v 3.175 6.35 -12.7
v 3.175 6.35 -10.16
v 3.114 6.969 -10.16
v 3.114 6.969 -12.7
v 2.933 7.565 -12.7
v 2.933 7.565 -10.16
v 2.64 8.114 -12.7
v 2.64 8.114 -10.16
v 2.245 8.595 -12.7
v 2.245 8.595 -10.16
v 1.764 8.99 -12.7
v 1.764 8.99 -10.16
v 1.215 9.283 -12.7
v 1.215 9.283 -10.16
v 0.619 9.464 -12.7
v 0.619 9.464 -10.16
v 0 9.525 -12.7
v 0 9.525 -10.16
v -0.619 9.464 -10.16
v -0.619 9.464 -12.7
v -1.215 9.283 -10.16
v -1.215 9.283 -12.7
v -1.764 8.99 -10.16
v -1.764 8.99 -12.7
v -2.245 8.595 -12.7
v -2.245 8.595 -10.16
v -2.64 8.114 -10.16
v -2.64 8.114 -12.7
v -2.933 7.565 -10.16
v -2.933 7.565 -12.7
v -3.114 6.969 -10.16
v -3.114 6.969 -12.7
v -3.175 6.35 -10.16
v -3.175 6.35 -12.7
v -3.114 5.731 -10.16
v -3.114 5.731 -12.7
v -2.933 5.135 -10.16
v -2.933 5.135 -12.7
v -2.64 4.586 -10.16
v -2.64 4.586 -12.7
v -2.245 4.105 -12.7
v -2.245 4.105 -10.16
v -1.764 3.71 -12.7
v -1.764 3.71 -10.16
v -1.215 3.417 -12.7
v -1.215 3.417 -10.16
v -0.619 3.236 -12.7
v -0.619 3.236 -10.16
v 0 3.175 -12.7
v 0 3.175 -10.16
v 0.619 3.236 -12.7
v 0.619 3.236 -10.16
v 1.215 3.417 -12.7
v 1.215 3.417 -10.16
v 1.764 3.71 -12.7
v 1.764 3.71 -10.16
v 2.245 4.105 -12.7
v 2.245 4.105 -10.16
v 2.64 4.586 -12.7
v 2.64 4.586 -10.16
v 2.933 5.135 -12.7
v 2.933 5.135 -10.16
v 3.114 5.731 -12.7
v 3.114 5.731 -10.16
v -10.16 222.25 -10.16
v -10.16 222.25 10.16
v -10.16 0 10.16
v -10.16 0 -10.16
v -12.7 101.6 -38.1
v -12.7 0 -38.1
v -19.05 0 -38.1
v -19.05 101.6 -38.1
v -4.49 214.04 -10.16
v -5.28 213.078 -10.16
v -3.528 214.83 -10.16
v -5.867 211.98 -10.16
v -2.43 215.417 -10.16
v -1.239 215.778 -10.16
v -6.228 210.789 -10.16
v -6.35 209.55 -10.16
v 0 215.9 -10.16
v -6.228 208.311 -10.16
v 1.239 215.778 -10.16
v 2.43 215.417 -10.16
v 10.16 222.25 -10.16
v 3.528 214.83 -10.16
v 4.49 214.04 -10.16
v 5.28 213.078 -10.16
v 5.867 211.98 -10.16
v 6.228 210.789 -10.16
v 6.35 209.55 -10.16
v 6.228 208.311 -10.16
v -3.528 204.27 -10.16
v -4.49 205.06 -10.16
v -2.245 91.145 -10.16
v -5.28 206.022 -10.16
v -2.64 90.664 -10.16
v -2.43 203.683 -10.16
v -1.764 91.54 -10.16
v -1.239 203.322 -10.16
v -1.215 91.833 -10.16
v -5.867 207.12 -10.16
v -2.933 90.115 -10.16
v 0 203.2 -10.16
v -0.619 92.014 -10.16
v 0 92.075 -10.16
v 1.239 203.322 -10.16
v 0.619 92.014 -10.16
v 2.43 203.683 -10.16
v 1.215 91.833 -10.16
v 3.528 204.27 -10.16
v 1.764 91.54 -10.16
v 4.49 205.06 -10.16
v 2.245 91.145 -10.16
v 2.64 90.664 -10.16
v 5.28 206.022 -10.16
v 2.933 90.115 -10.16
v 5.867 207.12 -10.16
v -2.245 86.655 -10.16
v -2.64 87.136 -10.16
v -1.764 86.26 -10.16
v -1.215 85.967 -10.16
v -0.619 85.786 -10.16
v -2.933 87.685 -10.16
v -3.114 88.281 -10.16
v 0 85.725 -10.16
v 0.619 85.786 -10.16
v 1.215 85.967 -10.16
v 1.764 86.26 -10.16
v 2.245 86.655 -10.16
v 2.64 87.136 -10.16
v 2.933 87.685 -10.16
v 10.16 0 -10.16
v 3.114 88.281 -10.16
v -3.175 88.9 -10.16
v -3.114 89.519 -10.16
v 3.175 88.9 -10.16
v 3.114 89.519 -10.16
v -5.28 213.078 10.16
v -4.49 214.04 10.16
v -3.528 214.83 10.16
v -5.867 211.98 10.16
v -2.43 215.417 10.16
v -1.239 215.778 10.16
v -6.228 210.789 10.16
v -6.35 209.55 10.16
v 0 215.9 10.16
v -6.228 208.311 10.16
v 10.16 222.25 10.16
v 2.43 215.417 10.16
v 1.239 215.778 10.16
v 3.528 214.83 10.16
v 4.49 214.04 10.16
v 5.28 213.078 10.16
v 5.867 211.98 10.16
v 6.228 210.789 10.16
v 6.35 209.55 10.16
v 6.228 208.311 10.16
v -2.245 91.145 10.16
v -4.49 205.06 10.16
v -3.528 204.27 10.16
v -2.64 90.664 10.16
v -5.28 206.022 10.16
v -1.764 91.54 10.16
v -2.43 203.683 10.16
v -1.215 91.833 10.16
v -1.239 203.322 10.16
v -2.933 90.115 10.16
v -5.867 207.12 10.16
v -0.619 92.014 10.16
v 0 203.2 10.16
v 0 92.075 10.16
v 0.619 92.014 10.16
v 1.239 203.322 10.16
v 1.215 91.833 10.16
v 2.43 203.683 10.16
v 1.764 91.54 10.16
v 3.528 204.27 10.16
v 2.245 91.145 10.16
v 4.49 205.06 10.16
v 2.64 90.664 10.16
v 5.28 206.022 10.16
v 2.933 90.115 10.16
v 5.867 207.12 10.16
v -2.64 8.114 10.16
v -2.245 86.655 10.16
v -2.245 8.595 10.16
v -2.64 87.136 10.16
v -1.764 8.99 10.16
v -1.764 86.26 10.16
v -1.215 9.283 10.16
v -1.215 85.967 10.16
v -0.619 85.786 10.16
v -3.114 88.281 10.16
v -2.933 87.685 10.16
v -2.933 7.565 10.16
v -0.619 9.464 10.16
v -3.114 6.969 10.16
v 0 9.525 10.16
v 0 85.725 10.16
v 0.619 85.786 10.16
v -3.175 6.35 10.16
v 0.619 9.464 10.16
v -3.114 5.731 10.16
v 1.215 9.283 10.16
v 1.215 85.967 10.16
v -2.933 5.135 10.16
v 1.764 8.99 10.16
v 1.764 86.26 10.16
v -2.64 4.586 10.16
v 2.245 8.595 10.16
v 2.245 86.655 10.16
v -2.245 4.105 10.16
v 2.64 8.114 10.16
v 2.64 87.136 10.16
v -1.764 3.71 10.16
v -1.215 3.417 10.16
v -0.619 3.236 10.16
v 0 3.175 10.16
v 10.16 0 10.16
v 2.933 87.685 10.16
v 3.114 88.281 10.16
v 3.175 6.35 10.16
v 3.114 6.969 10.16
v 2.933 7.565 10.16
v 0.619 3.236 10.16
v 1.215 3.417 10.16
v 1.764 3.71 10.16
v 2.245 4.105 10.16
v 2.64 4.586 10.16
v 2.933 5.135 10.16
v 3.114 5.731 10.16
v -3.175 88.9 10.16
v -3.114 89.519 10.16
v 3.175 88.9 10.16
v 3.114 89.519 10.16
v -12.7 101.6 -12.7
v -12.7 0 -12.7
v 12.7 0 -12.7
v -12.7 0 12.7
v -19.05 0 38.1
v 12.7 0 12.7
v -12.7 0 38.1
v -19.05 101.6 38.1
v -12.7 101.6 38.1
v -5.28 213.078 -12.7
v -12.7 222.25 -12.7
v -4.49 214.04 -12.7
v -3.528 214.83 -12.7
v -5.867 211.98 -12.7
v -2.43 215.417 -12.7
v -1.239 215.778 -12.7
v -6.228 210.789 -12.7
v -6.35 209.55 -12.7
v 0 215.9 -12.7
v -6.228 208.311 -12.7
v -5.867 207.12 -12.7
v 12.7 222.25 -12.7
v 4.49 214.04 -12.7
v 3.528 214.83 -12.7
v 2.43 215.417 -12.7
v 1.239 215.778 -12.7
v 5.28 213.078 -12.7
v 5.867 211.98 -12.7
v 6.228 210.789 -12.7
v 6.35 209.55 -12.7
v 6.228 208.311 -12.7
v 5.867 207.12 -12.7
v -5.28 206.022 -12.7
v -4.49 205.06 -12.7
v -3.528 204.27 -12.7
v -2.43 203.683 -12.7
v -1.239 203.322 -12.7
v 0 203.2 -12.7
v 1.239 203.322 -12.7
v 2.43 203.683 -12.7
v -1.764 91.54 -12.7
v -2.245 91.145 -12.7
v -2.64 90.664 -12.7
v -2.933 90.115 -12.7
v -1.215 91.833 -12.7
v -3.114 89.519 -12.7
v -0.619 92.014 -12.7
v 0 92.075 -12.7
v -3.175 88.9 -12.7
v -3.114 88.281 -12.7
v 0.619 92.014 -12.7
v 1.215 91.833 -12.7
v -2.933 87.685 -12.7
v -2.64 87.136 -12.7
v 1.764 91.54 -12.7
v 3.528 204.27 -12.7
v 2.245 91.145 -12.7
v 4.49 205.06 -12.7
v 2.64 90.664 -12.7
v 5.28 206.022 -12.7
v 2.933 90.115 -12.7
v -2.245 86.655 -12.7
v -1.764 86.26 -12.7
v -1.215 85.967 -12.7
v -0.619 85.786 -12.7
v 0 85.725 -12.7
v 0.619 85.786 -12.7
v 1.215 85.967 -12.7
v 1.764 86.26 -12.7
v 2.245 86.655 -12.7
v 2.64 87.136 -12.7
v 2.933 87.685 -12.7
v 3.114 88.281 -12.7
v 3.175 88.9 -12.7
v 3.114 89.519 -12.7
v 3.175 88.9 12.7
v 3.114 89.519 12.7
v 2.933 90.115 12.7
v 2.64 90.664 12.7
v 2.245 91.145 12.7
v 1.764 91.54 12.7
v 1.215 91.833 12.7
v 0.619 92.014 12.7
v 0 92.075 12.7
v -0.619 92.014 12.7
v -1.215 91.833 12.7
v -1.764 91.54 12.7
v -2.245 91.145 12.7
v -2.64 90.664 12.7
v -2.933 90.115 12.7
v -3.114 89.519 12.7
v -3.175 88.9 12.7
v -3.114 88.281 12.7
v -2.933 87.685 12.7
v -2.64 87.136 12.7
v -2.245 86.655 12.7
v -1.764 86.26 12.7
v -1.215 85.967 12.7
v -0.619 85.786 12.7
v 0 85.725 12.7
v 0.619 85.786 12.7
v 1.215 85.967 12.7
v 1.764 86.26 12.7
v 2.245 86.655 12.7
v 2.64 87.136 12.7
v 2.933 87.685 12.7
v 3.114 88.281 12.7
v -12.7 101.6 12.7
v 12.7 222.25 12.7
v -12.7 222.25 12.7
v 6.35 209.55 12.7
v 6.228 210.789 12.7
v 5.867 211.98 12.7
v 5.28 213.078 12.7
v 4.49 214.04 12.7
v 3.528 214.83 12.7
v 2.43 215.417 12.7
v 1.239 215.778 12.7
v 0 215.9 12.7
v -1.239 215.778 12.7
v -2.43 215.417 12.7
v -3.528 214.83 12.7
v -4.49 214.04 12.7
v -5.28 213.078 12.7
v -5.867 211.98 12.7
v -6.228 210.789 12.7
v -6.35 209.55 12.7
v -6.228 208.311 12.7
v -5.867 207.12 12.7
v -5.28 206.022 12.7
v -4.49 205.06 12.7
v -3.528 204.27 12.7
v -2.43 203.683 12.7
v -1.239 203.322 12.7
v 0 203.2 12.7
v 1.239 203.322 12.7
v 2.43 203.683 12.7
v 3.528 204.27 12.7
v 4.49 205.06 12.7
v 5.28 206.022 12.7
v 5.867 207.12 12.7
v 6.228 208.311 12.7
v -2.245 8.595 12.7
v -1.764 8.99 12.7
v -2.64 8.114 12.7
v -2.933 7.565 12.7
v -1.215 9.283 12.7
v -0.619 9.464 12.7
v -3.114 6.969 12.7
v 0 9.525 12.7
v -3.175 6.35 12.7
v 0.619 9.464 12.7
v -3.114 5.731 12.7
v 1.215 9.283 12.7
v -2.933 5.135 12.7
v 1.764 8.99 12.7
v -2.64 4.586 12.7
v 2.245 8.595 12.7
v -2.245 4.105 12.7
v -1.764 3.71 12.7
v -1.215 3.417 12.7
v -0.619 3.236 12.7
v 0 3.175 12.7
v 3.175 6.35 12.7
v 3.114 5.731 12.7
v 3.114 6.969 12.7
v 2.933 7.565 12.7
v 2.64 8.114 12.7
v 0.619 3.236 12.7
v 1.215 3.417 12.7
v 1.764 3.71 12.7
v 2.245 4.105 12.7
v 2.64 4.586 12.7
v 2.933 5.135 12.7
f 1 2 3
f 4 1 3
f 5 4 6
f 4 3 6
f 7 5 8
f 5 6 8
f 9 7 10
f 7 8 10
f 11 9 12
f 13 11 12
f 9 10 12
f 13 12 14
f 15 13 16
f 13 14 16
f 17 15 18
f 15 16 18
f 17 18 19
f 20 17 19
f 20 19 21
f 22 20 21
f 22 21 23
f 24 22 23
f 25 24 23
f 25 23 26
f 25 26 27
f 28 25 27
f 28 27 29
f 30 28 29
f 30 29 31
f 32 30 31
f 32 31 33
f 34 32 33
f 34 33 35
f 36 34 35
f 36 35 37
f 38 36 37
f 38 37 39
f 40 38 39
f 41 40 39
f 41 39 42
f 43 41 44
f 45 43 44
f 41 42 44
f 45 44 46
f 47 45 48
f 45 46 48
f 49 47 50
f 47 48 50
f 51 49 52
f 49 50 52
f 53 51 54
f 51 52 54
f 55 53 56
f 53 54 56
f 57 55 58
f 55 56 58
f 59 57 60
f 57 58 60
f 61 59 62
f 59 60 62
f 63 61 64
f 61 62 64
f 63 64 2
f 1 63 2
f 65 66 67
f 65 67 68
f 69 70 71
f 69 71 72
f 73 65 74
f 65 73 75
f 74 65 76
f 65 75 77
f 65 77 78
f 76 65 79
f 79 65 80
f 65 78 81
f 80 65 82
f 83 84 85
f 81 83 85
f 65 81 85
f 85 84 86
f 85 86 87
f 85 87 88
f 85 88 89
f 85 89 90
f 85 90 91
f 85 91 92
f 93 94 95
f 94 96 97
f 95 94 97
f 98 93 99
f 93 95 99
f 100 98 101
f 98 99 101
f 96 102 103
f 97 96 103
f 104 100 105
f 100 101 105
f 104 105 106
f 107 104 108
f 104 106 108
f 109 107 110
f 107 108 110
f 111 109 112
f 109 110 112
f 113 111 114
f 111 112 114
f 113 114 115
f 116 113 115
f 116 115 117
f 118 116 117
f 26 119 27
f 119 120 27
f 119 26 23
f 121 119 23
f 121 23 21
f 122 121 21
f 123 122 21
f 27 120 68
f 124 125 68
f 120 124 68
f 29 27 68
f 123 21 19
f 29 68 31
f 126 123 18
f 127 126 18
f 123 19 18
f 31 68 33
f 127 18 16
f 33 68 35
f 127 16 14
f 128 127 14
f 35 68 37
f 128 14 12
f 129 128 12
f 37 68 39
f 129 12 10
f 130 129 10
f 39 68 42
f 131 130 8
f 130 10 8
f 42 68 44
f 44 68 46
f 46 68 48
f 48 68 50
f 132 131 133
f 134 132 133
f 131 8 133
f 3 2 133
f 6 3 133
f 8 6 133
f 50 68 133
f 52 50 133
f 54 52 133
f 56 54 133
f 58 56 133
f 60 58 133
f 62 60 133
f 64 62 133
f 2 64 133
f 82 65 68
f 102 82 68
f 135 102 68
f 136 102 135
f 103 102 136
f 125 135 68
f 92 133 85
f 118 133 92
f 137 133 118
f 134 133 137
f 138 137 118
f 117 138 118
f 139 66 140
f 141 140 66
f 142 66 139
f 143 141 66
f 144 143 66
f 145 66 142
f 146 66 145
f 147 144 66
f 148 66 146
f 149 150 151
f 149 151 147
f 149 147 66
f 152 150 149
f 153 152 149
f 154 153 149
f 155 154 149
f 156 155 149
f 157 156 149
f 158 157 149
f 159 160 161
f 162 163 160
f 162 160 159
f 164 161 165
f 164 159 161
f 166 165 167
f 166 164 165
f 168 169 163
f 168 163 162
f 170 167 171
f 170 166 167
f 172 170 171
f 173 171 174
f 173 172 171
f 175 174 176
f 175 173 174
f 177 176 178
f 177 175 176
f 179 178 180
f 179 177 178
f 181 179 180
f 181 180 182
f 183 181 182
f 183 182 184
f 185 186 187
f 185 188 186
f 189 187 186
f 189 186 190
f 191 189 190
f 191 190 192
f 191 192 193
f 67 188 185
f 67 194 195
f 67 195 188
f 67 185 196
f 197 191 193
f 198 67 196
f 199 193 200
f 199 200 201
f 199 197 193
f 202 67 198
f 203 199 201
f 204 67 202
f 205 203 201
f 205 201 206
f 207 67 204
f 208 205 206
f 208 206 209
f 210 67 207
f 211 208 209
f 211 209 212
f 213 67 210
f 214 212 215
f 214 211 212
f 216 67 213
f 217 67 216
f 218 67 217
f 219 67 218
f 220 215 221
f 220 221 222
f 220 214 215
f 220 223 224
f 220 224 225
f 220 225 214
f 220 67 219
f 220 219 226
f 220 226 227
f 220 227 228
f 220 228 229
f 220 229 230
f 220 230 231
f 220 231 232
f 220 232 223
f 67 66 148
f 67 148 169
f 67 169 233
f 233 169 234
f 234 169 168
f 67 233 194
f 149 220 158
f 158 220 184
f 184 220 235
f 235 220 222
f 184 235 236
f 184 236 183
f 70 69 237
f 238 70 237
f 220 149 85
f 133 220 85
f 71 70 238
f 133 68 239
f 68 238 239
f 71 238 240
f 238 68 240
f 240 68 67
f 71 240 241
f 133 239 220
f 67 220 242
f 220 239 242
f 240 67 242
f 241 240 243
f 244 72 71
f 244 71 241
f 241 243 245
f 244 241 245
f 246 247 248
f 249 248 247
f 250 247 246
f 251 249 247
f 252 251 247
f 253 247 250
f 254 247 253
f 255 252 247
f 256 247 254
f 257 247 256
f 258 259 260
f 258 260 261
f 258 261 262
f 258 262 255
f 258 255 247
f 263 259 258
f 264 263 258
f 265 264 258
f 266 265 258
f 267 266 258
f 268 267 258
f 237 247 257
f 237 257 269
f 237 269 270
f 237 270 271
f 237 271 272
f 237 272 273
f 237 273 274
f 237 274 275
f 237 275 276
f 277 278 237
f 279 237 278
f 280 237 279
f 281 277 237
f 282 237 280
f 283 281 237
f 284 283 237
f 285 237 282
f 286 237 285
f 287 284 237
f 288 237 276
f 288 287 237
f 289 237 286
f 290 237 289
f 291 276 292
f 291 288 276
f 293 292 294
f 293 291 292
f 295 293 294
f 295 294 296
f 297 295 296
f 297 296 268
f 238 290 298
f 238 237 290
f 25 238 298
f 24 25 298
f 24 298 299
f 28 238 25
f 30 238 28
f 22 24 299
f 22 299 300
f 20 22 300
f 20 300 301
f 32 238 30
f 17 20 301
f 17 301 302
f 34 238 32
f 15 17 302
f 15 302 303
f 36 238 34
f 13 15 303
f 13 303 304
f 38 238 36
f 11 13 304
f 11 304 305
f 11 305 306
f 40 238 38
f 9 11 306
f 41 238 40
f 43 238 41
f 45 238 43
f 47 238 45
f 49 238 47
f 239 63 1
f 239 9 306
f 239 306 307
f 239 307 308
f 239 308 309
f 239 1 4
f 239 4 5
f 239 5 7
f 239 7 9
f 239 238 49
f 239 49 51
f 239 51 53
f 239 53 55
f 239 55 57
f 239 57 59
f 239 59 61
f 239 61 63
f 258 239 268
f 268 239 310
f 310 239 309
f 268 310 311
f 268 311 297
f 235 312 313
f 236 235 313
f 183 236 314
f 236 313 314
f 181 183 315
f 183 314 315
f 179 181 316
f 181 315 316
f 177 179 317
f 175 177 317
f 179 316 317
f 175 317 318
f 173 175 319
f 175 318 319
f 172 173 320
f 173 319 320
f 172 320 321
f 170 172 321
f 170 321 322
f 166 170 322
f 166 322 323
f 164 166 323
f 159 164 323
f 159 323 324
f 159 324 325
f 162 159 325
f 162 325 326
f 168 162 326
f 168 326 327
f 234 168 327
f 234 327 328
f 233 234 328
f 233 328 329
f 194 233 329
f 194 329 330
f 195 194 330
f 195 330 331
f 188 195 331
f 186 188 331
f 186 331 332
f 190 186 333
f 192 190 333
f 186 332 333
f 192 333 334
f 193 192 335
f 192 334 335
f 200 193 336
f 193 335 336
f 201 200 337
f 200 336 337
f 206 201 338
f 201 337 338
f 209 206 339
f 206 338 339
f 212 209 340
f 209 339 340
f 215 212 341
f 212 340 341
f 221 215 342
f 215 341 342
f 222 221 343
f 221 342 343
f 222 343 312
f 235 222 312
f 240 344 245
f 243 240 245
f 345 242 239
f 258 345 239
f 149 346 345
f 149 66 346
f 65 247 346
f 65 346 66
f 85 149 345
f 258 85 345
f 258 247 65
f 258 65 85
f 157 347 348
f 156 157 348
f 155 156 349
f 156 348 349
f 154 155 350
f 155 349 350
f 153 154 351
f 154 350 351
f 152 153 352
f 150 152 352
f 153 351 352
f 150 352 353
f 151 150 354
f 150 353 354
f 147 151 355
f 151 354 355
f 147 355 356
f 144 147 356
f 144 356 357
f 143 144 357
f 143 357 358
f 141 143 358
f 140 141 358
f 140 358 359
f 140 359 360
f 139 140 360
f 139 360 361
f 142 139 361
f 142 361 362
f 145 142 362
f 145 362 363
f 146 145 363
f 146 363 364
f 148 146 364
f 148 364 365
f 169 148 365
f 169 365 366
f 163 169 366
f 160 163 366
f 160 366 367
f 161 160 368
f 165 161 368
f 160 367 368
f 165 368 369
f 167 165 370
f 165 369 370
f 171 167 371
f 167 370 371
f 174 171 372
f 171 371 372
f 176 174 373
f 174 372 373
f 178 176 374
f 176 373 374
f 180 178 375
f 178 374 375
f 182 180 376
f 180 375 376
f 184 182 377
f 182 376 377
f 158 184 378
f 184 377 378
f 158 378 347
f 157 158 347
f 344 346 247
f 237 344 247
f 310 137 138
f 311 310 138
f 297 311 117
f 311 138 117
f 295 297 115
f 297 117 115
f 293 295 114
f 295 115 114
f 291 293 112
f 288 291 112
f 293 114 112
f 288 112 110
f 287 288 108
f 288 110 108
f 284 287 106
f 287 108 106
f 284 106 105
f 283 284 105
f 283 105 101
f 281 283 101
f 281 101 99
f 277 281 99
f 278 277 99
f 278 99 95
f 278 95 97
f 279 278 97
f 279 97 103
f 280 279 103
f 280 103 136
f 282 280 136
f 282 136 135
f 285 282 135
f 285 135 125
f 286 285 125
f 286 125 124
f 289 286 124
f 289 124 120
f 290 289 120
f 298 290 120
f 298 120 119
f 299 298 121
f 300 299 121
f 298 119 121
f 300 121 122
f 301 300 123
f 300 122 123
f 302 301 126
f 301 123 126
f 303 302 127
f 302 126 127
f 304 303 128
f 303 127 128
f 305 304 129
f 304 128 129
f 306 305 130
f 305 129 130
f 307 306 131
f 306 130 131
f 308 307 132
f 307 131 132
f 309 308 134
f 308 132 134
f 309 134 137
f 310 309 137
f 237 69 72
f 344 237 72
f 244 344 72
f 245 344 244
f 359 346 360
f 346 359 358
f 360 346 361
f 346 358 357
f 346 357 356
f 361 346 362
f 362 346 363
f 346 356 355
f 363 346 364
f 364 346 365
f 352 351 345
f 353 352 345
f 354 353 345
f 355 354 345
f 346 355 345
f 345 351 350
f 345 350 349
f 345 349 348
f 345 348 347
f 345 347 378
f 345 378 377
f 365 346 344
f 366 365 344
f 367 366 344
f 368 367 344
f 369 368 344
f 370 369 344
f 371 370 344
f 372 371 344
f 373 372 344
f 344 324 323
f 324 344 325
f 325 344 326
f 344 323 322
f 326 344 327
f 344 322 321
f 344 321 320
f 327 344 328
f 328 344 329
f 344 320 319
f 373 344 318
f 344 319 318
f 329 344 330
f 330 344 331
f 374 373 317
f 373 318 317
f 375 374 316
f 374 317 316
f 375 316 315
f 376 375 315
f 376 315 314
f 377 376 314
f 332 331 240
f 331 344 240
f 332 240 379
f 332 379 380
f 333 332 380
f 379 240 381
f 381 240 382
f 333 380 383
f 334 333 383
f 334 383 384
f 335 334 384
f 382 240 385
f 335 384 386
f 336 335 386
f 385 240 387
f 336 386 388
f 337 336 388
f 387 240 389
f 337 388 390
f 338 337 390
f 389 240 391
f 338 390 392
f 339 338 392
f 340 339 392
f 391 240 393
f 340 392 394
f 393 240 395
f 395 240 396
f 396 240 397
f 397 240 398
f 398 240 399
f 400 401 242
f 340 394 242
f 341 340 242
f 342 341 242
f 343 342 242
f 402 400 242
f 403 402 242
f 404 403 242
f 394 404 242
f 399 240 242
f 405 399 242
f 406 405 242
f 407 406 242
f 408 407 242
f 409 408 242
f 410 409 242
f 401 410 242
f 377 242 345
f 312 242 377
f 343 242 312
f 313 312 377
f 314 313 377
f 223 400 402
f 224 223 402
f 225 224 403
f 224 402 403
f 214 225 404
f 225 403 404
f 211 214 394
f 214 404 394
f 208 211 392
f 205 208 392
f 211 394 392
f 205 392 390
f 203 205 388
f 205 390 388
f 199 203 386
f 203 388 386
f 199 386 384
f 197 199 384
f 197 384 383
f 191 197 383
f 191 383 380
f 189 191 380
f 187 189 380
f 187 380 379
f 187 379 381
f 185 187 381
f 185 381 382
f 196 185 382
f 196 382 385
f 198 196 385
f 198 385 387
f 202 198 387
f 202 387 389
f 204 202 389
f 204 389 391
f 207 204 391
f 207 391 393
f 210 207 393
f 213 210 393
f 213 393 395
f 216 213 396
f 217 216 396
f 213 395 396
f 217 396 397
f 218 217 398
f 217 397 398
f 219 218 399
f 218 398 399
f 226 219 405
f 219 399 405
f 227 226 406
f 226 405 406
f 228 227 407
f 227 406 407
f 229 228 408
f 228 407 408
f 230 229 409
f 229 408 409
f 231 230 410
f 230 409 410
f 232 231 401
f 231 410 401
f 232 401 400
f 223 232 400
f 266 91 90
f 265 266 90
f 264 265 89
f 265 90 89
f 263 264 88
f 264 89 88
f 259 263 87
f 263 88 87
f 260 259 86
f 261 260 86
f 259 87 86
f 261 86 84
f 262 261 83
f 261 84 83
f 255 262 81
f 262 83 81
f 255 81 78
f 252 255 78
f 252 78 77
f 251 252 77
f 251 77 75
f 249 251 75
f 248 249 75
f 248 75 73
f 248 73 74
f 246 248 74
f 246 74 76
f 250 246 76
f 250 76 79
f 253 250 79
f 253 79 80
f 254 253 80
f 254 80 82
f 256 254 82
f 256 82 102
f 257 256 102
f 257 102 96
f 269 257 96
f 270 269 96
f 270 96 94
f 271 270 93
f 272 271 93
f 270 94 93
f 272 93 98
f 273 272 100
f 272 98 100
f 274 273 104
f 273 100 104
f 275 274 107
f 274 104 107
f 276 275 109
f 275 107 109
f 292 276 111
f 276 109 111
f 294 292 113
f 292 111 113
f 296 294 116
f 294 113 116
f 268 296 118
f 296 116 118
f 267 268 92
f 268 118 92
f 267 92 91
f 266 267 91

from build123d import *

# Parameters (mm, degrees)
SKETCH1_W           = 25.4
SKETCH1_H           = 25.4
SKETCH1_W_2         = 20.32
SKETCH1_H_2         = 20.32
BOSS_EXTRUDE1_DEPTH = 222.25
SKETCH2_R           = 6.35
SKETCH2_R_2         = 3.175
CUT_EXTRUDE1_DEPTH  = 222.25
SKETCH4_W           = 76.2
SKETCH4_H           = 101.6
BOSS_EXTRUDE3_DEPTH = 6.35


with BuildPart() as part:
    # Sketch1 → Boss-Extrude1 (new body)
    with BuildSketch(Plane(origin=(0, 0, 0), x_dir=(1, 0, 0), z_dir=(0, 1, 0))):
        Rectangle(SKETCH1_W, SKETCH1_H)
        Rectangle(SKETCH1_W_2, SKETCH1_H_2, mode=Mode.SUBTRACT)
    extrude(amount=BOSS_EXTRUDE1_DEPTH)

    # Sketch2 → Cut-Extrude1 (cut)
    with BuildSketch(Plane.XY.offset(12.7)):
        with Locations((0, 209.55)):
            Circle(SKETCH2_R)
        with Locations((0, 6.35)):
            Circle(SKETCH2_R_2)
        with Locations((0, 88.9)):
            Circle(SKETCH2_R_2)
    extrude(amount=-CUT_EXTRUDE1_DEPTH, mode=Mode.SUBTRACT)

    # Sketch4 → Boss-Extrude3 (add)
    with BuildSketch(Plane.ZY.offset(12.7)):
        with Locations((0, 50.8)):
            Rectangle(SKETCH4_W, SKETCH4_H)
    extrude(amount=BOSS_EXTRUDE3_DEPTH)


solid = part.part
